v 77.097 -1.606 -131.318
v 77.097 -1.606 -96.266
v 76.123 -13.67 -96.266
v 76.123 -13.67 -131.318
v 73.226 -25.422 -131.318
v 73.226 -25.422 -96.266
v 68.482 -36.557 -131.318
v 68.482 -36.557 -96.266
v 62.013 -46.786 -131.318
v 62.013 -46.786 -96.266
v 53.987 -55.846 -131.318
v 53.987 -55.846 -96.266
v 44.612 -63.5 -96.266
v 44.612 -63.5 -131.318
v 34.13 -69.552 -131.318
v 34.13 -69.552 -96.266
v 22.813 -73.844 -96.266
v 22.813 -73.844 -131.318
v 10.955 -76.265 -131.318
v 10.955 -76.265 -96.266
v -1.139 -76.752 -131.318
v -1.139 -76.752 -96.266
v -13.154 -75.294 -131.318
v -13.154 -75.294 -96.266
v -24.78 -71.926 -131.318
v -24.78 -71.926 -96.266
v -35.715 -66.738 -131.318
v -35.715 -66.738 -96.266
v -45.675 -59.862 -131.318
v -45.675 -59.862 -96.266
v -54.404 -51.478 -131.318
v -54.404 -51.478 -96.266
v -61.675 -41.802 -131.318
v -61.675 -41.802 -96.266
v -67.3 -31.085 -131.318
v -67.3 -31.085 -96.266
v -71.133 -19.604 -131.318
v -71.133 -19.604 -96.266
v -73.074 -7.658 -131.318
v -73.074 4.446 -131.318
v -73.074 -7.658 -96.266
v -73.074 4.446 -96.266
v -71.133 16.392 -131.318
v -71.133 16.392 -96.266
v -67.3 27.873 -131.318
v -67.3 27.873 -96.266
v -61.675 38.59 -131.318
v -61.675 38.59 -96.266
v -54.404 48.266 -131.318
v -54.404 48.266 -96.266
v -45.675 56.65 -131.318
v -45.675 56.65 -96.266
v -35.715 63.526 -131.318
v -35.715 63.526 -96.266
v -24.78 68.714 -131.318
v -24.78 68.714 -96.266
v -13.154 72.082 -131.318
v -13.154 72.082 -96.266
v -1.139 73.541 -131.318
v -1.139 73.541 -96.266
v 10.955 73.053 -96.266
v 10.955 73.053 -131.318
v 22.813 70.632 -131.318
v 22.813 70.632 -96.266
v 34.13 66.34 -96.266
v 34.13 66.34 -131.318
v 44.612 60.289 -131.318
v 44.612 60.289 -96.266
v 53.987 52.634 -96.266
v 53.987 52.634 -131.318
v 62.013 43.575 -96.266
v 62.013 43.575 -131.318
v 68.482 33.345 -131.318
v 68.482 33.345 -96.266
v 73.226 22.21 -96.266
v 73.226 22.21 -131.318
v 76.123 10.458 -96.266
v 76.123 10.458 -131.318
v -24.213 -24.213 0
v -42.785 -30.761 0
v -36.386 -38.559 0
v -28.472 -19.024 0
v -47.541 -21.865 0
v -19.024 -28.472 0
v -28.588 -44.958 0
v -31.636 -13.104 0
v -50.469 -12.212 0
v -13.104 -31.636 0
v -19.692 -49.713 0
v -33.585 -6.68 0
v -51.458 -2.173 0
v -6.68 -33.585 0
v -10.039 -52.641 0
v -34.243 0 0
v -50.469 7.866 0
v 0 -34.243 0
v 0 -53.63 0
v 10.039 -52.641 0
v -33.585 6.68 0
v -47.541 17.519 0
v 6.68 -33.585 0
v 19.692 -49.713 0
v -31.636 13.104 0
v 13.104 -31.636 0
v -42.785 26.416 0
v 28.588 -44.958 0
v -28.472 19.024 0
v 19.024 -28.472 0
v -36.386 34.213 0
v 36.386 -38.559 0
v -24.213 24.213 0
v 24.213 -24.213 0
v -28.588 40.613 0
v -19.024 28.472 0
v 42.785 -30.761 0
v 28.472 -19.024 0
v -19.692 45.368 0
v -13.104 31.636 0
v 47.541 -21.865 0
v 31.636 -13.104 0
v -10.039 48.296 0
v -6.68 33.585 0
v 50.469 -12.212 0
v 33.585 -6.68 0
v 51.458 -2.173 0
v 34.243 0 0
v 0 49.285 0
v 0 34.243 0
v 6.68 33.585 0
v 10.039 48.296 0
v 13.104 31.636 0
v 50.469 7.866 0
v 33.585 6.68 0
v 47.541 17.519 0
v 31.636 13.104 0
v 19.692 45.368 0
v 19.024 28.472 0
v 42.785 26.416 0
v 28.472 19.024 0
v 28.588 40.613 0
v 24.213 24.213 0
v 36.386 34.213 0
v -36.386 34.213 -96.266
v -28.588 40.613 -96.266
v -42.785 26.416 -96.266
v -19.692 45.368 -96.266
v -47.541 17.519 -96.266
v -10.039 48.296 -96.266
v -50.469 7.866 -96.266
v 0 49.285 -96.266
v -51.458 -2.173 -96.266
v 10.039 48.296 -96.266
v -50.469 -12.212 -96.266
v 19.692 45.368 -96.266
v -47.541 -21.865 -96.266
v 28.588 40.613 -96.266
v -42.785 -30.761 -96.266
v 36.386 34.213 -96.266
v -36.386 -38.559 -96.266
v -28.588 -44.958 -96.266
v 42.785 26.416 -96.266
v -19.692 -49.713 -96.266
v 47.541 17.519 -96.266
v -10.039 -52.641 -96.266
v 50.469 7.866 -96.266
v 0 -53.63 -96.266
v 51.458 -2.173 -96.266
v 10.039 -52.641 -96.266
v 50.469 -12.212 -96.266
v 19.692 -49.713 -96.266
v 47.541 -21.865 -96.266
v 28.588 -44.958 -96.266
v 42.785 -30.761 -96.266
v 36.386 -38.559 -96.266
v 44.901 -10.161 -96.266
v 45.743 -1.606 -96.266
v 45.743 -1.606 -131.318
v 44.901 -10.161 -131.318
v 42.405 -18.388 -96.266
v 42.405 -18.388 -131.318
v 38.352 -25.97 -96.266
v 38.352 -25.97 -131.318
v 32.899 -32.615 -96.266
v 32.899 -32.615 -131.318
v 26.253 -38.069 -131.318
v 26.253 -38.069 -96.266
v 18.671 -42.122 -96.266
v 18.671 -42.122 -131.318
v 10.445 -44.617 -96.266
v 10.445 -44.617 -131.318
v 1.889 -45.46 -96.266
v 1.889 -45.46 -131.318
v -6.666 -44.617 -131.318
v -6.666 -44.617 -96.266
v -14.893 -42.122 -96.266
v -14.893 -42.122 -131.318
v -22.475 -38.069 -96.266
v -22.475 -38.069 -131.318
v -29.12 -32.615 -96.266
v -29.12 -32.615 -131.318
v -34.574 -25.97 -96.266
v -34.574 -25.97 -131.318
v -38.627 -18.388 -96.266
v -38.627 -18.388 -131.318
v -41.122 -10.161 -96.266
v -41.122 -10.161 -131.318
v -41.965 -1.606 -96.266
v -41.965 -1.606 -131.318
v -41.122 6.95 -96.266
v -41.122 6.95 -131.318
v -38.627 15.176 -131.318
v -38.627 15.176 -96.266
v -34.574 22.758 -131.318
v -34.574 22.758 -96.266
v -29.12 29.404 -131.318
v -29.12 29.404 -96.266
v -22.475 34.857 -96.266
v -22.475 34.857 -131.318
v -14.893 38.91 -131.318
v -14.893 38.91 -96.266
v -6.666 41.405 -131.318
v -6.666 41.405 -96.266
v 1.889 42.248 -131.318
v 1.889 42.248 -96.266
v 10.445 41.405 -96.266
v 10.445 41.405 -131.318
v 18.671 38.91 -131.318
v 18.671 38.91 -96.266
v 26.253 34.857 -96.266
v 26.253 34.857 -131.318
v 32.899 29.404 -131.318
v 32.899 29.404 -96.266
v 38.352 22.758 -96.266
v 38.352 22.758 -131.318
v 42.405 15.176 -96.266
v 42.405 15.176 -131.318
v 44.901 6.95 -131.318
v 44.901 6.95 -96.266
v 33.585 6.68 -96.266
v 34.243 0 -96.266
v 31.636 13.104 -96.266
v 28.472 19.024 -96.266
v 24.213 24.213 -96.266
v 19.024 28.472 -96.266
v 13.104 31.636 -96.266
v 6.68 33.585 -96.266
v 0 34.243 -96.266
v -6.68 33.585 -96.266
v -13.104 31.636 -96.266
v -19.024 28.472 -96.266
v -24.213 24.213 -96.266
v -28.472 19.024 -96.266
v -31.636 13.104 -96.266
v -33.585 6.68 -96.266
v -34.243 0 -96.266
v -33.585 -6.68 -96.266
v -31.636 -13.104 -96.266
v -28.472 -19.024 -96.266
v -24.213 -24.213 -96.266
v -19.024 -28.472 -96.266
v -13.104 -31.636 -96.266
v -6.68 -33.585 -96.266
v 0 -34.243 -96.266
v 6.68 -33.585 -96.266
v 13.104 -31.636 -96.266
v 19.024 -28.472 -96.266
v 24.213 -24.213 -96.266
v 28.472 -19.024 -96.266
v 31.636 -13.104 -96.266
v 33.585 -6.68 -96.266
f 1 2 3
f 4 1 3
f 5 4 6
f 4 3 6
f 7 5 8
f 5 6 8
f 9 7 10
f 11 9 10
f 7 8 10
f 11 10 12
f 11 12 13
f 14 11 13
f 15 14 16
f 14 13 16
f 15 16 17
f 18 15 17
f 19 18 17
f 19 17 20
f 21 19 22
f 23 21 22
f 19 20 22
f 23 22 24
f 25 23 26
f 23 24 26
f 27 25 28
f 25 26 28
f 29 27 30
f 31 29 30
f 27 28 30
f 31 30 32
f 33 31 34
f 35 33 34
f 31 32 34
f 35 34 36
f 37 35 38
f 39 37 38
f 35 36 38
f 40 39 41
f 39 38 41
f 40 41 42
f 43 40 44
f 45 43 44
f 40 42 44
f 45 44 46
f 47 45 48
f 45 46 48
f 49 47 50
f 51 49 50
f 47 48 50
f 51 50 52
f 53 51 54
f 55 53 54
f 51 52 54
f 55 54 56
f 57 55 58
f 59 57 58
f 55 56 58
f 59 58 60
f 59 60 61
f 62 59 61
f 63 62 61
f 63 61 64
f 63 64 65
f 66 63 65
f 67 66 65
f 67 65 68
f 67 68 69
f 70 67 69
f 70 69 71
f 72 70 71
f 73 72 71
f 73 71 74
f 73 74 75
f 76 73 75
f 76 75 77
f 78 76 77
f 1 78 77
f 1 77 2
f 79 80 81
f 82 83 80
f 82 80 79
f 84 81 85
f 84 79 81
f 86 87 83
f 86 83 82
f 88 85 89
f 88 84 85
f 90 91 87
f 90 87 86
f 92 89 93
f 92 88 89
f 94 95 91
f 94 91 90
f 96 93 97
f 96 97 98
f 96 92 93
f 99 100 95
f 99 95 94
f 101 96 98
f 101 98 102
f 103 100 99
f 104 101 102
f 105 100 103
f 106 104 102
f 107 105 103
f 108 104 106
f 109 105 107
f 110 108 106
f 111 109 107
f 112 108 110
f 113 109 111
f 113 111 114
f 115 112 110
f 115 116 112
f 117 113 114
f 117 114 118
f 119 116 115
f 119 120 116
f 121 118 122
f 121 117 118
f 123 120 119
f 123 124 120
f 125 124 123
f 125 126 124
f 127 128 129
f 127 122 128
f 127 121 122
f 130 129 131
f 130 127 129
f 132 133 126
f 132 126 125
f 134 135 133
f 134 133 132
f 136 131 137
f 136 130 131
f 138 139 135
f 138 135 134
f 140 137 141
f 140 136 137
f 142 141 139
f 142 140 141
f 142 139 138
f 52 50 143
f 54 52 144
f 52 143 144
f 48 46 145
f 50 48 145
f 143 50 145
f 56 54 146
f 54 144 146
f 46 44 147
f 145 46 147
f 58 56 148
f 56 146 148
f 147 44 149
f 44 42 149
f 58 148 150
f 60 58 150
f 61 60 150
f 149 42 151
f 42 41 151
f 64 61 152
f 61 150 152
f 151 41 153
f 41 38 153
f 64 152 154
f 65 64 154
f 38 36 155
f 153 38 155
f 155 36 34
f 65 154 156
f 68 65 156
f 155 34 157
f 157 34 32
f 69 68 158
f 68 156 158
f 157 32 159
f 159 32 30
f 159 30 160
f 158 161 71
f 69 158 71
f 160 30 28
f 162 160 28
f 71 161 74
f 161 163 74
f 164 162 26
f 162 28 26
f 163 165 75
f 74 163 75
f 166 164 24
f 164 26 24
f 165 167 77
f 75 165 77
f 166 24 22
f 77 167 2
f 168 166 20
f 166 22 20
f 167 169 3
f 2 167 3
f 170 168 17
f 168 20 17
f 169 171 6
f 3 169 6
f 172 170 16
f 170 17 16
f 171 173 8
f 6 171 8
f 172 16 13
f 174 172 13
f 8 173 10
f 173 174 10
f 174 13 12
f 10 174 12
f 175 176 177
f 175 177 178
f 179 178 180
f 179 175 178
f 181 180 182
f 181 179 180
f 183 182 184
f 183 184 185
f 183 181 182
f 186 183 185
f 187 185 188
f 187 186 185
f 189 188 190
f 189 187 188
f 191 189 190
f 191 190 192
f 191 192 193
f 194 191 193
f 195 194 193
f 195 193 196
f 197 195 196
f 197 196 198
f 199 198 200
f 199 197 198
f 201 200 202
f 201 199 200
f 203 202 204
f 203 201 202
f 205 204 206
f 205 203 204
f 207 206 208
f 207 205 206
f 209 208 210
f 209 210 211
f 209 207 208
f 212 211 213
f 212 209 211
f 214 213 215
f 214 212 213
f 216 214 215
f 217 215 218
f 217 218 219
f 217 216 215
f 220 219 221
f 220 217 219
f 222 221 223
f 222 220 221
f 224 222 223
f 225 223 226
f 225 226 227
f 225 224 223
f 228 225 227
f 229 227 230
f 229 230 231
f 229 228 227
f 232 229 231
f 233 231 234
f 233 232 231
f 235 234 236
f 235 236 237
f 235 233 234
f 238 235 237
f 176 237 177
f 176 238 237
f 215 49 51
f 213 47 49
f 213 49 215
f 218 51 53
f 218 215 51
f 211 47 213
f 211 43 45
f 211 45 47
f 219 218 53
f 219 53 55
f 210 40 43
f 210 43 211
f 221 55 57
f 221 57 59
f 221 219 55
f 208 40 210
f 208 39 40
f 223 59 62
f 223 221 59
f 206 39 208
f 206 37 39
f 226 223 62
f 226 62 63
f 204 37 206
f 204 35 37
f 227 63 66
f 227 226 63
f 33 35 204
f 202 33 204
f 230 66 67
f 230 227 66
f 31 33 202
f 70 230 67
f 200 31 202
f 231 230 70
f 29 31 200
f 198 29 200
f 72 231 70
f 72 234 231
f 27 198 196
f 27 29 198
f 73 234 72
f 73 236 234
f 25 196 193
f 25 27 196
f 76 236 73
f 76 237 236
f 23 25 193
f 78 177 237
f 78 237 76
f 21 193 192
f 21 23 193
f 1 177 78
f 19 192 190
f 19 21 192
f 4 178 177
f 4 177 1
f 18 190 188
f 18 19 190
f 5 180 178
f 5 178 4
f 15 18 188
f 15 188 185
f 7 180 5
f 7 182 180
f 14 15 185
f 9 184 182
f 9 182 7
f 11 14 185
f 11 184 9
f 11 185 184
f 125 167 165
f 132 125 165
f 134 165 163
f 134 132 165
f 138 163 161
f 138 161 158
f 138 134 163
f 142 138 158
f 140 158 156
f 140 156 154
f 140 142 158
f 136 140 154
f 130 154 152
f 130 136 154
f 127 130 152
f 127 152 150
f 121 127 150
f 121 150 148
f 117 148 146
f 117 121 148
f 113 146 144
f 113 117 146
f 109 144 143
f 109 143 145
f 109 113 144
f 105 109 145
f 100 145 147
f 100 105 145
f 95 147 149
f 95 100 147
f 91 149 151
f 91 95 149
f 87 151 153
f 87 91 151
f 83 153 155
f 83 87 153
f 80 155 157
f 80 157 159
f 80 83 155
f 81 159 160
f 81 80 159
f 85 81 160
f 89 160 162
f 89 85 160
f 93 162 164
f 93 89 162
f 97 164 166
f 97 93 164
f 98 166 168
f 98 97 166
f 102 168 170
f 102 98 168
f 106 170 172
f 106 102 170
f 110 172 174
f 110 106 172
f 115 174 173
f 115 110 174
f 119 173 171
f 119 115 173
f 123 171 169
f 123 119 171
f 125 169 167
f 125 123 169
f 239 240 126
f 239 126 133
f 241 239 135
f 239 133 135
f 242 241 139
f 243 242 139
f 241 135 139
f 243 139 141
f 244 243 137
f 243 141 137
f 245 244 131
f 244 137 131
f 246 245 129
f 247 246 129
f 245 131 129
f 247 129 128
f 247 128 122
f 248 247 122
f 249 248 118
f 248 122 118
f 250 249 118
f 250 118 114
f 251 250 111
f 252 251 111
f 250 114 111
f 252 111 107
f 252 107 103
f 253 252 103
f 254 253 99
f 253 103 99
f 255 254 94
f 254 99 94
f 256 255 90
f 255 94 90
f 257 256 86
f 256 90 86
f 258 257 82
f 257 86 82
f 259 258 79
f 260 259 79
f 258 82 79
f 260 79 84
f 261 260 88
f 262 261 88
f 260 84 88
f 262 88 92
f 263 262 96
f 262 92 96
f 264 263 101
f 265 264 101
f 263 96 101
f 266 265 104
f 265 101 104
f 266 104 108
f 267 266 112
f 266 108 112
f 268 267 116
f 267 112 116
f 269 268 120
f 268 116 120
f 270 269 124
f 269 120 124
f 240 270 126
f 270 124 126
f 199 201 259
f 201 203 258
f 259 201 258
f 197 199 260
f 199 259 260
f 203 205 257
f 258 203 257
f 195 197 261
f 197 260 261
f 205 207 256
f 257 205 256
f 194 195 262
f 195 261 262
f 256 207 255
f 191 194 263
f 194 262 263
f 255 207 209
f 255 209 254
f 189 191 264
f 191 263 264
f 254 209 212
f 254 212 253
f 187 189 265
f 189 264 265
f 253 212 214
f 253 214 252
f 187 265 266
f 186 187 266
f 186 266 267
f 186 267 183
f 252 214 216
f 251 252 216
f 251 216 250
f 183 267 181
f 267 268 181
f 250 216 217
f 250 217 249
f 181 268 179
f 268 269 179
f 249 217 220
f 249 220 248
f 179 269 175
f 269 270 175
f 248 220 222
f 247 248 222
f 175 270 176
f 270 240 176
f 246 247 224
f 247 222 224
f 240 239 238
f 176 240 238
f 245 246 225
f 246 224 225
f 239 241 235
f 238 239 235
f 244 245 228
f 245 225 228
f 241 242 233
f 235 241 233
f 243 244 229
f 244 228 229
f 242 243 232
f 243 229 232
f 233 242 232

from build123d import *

# Parameters (mm, degrees)
F0_R     = 51.457531
F0_R_2   = 34.242605
F1_DEPTH = 96.266
F2_R     = 75.207579
F2_R_2   = 43.853945
F3_DEPTH = 35.052


with BuildPart() as f1:
    # F0 (on Top) → F1 (new body)
    with BuildSketch(Plane.XY):
        with Locations((0, -2.172645)):
            Circle(F0_R)
        Circle(F0_R_2, mode=Mode.SUBTRACT)
    extrude(amount=-F1_DEPTH)

    # F2 (on face) → F3 (join)
    with BuildSketch(Plane(origin=(0, 0, -96.266), x_dir=(1, 0, 0), z_dir=(0, 0, -1))):
        with Locations((1.889259, 1.605868)):
            Circle(F2_R)
        with Locations((1.889259, 1.605868)):
            Circle(F2_R_2, mode=Mode.SUBTRACT)
    extrude(amount=F3_DEPTH)


solid = f1.part
